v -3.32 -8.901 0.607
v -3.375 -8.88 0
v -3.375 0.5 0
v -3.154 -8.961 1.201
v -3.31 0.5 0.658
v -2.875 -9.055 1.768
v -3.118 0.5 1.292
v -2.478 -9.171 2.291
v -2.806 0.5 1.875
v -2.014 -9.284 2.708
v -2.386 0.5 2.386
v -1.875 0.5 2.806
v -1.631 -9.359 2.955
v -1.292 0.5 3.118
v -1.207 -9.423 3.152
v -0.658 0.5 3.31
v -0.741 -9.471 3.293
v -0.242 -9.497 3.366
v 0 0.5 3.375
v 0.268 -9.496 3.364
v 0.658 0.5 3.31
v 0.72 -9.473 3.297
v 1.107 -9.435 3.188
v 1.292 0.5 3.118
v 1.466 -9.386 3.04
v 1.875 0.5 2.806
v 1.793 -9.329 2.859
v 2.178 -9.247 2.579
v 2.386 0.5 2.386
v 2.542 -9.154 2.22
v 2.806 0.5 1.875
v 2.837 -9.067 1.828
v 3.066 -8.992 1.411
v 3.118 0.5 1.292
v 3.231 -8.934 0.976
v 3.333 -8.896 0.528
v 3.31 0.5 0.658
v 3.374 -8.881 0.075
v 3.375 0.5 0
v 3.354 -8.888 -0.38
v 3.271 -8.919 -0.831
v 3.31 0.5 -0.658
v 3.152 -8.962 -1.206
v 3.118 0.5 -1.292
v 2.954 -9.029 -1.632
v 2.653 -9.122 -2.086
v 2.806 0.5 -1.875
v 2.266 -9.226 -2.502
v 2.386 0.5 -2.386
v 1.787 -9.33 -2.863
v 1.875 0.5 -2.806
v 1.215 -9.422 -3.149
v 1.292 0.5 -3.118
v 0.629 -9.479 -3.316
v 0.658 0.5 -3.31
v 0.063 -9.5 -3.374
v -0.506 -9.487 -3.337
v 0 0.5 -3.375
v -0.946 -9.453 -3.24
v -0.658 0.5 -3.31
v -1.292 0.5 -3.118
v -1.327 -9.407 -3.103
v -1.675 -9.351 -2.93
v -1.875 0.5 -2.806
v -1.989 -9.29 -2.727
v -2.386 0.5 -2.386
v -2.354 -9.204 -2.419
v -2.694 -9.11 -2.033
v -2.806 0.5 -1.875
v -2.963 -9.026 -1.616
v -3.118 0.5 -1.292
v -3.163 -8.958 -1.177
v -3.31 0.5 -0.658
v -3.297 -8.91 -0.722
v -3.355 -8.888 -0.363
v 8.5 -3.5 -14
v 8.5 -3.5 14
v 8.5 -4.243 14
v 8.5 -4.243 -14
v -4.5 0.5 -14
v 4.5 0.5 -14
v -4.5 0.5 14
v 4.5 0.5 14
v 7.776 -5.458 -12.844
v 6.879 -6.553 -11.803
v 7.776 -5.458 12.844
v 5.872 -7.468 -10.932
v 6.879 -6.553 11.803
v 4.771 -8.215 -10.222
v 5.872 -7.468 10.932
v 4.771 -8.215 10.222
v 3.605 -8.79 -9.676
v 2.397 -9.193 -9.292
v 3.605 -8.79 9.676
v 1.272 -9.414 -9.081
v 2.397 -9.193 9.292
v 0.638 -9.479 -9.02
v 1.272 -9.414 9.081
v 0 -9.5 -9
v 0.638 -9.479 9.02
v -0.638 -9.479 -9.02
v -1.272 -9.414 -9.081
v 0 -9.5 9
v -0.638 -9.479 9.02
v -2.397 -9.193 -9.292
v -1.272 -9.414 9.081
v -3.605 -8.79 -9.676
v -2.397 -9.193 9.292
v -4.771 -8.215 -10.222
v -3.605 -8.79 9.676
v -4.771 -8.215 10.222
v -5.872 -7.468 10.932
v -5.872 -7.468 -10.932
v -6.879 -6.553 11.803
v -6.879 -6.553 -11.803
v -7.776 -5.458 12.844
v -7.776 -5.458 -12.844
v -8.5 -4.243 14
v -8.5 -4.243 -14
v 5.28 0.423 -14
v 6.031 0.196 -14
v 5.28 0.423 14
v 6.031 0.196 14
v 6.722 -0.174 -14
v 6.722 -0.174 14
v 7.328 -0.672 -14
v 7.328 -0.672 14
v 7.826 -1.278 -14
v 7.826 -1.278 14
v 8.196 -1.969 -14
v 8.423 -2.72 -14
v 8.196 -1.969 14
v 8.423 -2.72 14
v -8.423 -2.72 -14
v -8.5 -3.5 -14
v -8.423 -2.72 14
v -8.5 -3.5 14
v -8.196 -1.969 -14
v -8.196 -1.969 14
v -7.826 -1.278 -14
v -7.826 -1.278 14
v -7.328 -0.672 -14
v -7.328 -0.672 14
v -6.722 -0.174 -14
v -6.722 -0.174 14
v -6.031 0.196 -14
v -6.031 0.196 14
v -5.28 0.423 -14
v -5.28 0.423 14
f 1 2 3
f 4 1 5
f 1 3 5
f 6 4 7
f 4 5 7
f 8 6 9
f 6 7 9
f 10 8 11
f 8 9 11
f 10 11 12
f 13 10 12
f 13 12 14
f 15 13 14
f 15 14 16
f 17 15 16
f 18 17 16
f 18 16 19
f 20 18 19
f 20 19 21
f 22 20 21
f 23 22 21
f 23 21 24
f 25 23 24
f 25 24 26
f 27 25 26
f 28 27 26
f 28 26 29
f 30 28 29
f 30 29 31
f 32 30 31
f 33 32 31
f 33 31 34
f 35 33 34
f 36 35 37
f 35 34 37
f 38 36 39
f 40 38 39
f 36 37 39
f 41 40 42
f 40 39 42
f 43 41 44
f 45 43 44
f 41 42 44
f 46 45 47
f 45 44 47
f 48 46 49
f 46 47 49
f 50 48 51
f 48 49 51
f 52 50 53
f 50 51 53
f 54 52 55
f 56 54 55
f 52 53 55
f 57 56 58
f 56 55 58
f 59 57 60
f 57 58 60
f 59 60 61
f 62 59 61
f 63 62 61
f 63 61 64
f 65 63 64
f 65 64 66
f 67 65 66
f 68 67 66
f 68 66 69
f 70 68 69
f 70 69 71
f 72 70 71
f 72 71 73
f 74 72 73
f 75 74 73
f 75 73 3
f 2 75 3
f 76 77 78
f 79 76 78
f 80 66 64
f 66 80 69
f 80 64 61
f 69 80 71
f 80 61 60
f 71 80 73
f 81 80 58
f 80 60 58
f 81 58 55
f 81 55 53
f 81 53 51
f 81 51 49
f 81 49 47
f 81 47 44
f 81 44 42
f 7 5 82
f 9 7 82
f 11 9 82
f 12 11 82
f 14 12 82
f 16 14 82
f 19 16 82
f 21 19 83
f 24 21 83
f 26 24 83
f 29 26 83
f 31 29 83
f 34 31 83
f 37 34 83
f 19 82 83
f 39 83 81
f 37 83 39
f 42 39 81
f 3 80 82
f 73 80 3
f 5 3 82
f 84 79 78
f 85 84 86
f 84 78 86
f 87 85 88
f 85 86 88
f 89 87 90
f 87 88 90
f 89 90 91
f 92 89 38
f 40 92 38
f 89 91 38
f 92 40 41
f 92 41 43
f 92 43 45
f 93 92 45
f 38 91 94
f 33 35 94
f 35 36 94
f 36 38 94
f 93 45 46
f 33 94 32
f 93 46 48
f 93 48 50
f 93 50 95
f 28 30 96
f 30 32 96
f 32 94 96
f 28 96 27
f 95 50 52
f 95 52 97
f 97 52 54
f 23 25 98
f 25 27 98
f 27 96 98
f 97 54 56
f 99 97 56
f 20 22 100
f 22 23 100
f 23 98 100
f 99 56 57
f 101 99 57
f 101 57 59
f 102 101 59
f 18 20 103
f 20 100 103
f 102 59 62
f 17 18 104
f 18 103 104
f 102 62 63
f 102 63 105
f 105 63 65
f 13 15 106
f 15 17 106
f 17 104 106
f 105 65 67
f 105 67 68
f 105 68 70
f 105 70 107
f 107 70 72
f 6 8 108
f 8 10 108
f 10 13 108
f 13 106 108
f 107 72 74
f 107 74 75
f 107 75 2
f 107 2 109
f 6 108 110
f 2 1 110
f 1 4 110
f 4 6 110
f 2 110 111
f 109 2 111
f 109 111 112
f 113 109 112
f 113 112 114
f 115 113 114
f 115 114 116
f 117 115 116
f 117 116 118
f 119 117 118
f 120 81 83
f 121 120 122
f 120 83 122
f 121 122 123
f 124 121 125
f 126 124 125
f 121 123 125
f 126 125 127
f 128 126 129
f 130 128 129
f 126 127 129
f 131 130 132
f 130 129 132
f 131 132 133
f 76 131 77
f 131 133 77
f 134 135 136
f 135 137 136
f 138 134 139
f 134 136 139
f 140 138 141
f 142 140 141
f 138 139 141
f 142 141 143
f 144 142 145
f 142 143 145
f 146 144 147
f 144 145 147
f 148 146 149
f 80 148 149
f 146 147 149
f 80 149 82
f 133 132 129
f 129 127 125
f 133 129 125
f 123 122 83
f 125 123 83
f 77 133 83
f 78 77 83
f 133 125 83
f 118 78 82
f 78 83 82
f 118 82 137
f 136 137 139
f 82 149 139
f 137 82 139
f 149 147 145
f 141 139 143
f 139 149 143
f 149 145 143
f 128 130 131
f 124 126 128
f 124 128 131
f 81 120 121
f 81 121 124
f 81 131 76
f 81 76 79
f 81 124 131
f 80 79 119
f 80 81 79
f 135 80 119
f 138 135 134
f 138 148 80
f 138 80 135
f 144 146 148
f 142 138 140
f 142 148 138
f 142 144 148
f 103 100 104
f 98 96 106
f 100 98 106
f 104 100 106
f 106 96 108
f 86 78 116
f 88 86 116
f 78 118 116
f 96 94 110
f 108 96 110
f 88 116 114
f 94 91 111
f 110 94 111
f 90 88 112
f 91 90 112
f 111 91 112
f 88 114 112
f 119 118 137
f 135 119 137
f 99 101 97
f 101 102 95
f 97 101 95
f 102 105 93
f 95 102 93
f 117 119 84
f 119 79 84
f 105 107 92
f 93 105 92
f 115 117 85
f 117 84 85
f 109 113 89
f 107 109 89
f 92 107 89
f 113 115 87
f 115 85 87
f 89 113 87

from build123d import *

# Parameters (mm, degrees)
EXTRUSION1_DEPTH             = 14
ESQUISSE2_R                  = 3.375
ENL_V_MAT_EXTRU_1_DEPTH      = 11
ENL_V_MAT_EXTRU_2_DEPTH      = 9.5000001
ENL_V_MAT_EXTRU_2_DEPTH_BACK = 9.5000001


with BuildPart() as part:
    # Esquisse1 → Extrusion1 (new body, symmetric)
    with BuildSketch(Plane.XY):
        with BuildLine():
            Line((-8.5, -4.242640687), (-8.5, -3.5))
            ThreePointArc((-8.5, -3.5), (-7.328427125, -0.671572875), (-4.5, 0.5))
            Line((-4.5, 0.5), (4.5, 0.5))
            ThreePointArc((4.5, 0.5), (7.328427125, -0.671572875), (8.5, -3.5))
            Line((8.5, -3.5), (8.5, -4.242640687))
            ThreePointArc((8.5, -4.242640687), (0, -9.5), (-8.5, -4.242640687))
        make_face()
    extrude(amount=EXTRUSION1_DEPTH, both=True)

    # Esquisse2 → Enlèv. mat.-Extru.1 (cut, through all)
    with BuildSketch(Plane(origin=(0, 0.5, 0), x_dir=(-1, 0, 0), z_dir=(0, 1, 0))):
        Circle(ESQUISSE2_R)
    extrude(amount=-ENL_V_MAT_EXTRU_1_DEPTH, mode=Mode.SUBTRACT)

    # Esquisse3 → Enlèv. mat.-Extru.2 (cut, two sides)
    with BuildSketch(Plane(origin=(0, 0, 0), x_dir=(0, 0, -1), z_dir=(1, 0, 0))) as enl_v_mat_extru_2_sk:
        Polygon((14, -9.5), (14, -4.242640687), (9, -9.5), align=None)
        Polygon((-14, -9.5), (-14, -4.242640687), (-9, -9.5), align=None)
    extrude(amount=ENL_V_MAT_EXTRU_2_DEPTH, mode=Mode.SUBTRACT)
    extrude(enl_v_mat_extru_2_sk.sketch, amount=-ENL_V_MAT_EXTRU_2_DEPTH_BACK, mode=Mode.SUBTRACT)


solid = part.part
